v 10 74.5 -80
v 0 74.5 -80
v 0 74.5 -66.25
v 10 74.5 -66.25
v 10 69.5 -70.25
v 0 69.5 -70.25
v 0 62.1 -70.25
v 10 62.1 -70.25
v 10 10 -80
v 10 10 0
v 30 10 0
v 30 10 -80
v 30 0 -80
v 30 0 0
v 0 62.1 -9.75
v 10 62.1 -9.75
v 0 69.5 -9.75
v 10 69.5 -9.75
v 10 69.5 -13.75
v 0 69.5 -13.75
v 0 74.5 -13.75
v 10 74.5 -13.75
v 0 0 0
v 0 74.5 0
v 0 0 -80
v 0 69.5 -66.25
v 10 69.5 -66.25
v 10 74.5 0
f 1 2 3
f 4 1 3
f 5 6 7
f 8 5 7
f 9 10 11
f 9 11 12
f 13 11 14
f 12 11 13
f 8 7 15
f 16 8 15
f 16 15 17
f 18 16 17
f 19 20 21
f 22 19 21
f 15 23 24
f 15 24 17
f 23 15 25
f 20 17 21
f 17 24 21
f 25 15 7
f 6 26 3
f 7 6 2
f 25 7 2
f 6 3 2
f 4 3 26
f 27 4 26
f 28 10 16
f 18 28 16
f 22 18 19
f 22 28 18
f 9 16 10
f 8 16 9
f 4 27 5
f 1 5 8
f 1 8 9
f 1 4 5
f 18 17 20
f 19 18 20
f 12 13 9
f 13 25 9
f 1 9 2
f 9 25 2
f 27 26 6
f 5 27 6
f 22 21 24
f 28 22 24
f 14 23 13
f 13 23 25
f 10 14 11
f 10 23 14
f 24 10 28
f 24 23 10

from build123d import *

# Parameters (mm, degrees)
BOSS_EXTRUDE1_DEPTH = 10
SKETCH2_W           = 80
SKETCH2_H           = 10
BOSS_EXTRUDE2_DEPTH = 20


with BuildPart() as part:
    # Sketch1 → Boss-Extrude1 (new body)
    with BuildSketch(Plane(origin=(0, 0, 0), x_dir=(0, 0, -1), z_dir=(1, 0, 0))):
        Polygon((0, 0), (80, 0), (80, 74.5), (66.25, 74.5), (66.25, 69.5), (70.25, 69.5), (70.25, 62.1), (9.75, 62.1), (9.75, 69.5), (13.75, 69.5), (13.75, 74.5), (0, 74.5), align=None)
    extrude(amount=BOSS_EXTRUDE1_DEPTH)

    # Sketch2 → Boss-Extrude2 (add)
    with BuildSketch(Plane(origin=(10, 0, 0), x_dir=(0, 0, -1), z_dir=(1, 0, 0))):
        with Locations((40, 5)):
            Rectangle(SKETCH2_W, SKETCH2_H)
    extrude(amount=BOSS_EXTRUDE2_DEPTH)


solid = part.part
